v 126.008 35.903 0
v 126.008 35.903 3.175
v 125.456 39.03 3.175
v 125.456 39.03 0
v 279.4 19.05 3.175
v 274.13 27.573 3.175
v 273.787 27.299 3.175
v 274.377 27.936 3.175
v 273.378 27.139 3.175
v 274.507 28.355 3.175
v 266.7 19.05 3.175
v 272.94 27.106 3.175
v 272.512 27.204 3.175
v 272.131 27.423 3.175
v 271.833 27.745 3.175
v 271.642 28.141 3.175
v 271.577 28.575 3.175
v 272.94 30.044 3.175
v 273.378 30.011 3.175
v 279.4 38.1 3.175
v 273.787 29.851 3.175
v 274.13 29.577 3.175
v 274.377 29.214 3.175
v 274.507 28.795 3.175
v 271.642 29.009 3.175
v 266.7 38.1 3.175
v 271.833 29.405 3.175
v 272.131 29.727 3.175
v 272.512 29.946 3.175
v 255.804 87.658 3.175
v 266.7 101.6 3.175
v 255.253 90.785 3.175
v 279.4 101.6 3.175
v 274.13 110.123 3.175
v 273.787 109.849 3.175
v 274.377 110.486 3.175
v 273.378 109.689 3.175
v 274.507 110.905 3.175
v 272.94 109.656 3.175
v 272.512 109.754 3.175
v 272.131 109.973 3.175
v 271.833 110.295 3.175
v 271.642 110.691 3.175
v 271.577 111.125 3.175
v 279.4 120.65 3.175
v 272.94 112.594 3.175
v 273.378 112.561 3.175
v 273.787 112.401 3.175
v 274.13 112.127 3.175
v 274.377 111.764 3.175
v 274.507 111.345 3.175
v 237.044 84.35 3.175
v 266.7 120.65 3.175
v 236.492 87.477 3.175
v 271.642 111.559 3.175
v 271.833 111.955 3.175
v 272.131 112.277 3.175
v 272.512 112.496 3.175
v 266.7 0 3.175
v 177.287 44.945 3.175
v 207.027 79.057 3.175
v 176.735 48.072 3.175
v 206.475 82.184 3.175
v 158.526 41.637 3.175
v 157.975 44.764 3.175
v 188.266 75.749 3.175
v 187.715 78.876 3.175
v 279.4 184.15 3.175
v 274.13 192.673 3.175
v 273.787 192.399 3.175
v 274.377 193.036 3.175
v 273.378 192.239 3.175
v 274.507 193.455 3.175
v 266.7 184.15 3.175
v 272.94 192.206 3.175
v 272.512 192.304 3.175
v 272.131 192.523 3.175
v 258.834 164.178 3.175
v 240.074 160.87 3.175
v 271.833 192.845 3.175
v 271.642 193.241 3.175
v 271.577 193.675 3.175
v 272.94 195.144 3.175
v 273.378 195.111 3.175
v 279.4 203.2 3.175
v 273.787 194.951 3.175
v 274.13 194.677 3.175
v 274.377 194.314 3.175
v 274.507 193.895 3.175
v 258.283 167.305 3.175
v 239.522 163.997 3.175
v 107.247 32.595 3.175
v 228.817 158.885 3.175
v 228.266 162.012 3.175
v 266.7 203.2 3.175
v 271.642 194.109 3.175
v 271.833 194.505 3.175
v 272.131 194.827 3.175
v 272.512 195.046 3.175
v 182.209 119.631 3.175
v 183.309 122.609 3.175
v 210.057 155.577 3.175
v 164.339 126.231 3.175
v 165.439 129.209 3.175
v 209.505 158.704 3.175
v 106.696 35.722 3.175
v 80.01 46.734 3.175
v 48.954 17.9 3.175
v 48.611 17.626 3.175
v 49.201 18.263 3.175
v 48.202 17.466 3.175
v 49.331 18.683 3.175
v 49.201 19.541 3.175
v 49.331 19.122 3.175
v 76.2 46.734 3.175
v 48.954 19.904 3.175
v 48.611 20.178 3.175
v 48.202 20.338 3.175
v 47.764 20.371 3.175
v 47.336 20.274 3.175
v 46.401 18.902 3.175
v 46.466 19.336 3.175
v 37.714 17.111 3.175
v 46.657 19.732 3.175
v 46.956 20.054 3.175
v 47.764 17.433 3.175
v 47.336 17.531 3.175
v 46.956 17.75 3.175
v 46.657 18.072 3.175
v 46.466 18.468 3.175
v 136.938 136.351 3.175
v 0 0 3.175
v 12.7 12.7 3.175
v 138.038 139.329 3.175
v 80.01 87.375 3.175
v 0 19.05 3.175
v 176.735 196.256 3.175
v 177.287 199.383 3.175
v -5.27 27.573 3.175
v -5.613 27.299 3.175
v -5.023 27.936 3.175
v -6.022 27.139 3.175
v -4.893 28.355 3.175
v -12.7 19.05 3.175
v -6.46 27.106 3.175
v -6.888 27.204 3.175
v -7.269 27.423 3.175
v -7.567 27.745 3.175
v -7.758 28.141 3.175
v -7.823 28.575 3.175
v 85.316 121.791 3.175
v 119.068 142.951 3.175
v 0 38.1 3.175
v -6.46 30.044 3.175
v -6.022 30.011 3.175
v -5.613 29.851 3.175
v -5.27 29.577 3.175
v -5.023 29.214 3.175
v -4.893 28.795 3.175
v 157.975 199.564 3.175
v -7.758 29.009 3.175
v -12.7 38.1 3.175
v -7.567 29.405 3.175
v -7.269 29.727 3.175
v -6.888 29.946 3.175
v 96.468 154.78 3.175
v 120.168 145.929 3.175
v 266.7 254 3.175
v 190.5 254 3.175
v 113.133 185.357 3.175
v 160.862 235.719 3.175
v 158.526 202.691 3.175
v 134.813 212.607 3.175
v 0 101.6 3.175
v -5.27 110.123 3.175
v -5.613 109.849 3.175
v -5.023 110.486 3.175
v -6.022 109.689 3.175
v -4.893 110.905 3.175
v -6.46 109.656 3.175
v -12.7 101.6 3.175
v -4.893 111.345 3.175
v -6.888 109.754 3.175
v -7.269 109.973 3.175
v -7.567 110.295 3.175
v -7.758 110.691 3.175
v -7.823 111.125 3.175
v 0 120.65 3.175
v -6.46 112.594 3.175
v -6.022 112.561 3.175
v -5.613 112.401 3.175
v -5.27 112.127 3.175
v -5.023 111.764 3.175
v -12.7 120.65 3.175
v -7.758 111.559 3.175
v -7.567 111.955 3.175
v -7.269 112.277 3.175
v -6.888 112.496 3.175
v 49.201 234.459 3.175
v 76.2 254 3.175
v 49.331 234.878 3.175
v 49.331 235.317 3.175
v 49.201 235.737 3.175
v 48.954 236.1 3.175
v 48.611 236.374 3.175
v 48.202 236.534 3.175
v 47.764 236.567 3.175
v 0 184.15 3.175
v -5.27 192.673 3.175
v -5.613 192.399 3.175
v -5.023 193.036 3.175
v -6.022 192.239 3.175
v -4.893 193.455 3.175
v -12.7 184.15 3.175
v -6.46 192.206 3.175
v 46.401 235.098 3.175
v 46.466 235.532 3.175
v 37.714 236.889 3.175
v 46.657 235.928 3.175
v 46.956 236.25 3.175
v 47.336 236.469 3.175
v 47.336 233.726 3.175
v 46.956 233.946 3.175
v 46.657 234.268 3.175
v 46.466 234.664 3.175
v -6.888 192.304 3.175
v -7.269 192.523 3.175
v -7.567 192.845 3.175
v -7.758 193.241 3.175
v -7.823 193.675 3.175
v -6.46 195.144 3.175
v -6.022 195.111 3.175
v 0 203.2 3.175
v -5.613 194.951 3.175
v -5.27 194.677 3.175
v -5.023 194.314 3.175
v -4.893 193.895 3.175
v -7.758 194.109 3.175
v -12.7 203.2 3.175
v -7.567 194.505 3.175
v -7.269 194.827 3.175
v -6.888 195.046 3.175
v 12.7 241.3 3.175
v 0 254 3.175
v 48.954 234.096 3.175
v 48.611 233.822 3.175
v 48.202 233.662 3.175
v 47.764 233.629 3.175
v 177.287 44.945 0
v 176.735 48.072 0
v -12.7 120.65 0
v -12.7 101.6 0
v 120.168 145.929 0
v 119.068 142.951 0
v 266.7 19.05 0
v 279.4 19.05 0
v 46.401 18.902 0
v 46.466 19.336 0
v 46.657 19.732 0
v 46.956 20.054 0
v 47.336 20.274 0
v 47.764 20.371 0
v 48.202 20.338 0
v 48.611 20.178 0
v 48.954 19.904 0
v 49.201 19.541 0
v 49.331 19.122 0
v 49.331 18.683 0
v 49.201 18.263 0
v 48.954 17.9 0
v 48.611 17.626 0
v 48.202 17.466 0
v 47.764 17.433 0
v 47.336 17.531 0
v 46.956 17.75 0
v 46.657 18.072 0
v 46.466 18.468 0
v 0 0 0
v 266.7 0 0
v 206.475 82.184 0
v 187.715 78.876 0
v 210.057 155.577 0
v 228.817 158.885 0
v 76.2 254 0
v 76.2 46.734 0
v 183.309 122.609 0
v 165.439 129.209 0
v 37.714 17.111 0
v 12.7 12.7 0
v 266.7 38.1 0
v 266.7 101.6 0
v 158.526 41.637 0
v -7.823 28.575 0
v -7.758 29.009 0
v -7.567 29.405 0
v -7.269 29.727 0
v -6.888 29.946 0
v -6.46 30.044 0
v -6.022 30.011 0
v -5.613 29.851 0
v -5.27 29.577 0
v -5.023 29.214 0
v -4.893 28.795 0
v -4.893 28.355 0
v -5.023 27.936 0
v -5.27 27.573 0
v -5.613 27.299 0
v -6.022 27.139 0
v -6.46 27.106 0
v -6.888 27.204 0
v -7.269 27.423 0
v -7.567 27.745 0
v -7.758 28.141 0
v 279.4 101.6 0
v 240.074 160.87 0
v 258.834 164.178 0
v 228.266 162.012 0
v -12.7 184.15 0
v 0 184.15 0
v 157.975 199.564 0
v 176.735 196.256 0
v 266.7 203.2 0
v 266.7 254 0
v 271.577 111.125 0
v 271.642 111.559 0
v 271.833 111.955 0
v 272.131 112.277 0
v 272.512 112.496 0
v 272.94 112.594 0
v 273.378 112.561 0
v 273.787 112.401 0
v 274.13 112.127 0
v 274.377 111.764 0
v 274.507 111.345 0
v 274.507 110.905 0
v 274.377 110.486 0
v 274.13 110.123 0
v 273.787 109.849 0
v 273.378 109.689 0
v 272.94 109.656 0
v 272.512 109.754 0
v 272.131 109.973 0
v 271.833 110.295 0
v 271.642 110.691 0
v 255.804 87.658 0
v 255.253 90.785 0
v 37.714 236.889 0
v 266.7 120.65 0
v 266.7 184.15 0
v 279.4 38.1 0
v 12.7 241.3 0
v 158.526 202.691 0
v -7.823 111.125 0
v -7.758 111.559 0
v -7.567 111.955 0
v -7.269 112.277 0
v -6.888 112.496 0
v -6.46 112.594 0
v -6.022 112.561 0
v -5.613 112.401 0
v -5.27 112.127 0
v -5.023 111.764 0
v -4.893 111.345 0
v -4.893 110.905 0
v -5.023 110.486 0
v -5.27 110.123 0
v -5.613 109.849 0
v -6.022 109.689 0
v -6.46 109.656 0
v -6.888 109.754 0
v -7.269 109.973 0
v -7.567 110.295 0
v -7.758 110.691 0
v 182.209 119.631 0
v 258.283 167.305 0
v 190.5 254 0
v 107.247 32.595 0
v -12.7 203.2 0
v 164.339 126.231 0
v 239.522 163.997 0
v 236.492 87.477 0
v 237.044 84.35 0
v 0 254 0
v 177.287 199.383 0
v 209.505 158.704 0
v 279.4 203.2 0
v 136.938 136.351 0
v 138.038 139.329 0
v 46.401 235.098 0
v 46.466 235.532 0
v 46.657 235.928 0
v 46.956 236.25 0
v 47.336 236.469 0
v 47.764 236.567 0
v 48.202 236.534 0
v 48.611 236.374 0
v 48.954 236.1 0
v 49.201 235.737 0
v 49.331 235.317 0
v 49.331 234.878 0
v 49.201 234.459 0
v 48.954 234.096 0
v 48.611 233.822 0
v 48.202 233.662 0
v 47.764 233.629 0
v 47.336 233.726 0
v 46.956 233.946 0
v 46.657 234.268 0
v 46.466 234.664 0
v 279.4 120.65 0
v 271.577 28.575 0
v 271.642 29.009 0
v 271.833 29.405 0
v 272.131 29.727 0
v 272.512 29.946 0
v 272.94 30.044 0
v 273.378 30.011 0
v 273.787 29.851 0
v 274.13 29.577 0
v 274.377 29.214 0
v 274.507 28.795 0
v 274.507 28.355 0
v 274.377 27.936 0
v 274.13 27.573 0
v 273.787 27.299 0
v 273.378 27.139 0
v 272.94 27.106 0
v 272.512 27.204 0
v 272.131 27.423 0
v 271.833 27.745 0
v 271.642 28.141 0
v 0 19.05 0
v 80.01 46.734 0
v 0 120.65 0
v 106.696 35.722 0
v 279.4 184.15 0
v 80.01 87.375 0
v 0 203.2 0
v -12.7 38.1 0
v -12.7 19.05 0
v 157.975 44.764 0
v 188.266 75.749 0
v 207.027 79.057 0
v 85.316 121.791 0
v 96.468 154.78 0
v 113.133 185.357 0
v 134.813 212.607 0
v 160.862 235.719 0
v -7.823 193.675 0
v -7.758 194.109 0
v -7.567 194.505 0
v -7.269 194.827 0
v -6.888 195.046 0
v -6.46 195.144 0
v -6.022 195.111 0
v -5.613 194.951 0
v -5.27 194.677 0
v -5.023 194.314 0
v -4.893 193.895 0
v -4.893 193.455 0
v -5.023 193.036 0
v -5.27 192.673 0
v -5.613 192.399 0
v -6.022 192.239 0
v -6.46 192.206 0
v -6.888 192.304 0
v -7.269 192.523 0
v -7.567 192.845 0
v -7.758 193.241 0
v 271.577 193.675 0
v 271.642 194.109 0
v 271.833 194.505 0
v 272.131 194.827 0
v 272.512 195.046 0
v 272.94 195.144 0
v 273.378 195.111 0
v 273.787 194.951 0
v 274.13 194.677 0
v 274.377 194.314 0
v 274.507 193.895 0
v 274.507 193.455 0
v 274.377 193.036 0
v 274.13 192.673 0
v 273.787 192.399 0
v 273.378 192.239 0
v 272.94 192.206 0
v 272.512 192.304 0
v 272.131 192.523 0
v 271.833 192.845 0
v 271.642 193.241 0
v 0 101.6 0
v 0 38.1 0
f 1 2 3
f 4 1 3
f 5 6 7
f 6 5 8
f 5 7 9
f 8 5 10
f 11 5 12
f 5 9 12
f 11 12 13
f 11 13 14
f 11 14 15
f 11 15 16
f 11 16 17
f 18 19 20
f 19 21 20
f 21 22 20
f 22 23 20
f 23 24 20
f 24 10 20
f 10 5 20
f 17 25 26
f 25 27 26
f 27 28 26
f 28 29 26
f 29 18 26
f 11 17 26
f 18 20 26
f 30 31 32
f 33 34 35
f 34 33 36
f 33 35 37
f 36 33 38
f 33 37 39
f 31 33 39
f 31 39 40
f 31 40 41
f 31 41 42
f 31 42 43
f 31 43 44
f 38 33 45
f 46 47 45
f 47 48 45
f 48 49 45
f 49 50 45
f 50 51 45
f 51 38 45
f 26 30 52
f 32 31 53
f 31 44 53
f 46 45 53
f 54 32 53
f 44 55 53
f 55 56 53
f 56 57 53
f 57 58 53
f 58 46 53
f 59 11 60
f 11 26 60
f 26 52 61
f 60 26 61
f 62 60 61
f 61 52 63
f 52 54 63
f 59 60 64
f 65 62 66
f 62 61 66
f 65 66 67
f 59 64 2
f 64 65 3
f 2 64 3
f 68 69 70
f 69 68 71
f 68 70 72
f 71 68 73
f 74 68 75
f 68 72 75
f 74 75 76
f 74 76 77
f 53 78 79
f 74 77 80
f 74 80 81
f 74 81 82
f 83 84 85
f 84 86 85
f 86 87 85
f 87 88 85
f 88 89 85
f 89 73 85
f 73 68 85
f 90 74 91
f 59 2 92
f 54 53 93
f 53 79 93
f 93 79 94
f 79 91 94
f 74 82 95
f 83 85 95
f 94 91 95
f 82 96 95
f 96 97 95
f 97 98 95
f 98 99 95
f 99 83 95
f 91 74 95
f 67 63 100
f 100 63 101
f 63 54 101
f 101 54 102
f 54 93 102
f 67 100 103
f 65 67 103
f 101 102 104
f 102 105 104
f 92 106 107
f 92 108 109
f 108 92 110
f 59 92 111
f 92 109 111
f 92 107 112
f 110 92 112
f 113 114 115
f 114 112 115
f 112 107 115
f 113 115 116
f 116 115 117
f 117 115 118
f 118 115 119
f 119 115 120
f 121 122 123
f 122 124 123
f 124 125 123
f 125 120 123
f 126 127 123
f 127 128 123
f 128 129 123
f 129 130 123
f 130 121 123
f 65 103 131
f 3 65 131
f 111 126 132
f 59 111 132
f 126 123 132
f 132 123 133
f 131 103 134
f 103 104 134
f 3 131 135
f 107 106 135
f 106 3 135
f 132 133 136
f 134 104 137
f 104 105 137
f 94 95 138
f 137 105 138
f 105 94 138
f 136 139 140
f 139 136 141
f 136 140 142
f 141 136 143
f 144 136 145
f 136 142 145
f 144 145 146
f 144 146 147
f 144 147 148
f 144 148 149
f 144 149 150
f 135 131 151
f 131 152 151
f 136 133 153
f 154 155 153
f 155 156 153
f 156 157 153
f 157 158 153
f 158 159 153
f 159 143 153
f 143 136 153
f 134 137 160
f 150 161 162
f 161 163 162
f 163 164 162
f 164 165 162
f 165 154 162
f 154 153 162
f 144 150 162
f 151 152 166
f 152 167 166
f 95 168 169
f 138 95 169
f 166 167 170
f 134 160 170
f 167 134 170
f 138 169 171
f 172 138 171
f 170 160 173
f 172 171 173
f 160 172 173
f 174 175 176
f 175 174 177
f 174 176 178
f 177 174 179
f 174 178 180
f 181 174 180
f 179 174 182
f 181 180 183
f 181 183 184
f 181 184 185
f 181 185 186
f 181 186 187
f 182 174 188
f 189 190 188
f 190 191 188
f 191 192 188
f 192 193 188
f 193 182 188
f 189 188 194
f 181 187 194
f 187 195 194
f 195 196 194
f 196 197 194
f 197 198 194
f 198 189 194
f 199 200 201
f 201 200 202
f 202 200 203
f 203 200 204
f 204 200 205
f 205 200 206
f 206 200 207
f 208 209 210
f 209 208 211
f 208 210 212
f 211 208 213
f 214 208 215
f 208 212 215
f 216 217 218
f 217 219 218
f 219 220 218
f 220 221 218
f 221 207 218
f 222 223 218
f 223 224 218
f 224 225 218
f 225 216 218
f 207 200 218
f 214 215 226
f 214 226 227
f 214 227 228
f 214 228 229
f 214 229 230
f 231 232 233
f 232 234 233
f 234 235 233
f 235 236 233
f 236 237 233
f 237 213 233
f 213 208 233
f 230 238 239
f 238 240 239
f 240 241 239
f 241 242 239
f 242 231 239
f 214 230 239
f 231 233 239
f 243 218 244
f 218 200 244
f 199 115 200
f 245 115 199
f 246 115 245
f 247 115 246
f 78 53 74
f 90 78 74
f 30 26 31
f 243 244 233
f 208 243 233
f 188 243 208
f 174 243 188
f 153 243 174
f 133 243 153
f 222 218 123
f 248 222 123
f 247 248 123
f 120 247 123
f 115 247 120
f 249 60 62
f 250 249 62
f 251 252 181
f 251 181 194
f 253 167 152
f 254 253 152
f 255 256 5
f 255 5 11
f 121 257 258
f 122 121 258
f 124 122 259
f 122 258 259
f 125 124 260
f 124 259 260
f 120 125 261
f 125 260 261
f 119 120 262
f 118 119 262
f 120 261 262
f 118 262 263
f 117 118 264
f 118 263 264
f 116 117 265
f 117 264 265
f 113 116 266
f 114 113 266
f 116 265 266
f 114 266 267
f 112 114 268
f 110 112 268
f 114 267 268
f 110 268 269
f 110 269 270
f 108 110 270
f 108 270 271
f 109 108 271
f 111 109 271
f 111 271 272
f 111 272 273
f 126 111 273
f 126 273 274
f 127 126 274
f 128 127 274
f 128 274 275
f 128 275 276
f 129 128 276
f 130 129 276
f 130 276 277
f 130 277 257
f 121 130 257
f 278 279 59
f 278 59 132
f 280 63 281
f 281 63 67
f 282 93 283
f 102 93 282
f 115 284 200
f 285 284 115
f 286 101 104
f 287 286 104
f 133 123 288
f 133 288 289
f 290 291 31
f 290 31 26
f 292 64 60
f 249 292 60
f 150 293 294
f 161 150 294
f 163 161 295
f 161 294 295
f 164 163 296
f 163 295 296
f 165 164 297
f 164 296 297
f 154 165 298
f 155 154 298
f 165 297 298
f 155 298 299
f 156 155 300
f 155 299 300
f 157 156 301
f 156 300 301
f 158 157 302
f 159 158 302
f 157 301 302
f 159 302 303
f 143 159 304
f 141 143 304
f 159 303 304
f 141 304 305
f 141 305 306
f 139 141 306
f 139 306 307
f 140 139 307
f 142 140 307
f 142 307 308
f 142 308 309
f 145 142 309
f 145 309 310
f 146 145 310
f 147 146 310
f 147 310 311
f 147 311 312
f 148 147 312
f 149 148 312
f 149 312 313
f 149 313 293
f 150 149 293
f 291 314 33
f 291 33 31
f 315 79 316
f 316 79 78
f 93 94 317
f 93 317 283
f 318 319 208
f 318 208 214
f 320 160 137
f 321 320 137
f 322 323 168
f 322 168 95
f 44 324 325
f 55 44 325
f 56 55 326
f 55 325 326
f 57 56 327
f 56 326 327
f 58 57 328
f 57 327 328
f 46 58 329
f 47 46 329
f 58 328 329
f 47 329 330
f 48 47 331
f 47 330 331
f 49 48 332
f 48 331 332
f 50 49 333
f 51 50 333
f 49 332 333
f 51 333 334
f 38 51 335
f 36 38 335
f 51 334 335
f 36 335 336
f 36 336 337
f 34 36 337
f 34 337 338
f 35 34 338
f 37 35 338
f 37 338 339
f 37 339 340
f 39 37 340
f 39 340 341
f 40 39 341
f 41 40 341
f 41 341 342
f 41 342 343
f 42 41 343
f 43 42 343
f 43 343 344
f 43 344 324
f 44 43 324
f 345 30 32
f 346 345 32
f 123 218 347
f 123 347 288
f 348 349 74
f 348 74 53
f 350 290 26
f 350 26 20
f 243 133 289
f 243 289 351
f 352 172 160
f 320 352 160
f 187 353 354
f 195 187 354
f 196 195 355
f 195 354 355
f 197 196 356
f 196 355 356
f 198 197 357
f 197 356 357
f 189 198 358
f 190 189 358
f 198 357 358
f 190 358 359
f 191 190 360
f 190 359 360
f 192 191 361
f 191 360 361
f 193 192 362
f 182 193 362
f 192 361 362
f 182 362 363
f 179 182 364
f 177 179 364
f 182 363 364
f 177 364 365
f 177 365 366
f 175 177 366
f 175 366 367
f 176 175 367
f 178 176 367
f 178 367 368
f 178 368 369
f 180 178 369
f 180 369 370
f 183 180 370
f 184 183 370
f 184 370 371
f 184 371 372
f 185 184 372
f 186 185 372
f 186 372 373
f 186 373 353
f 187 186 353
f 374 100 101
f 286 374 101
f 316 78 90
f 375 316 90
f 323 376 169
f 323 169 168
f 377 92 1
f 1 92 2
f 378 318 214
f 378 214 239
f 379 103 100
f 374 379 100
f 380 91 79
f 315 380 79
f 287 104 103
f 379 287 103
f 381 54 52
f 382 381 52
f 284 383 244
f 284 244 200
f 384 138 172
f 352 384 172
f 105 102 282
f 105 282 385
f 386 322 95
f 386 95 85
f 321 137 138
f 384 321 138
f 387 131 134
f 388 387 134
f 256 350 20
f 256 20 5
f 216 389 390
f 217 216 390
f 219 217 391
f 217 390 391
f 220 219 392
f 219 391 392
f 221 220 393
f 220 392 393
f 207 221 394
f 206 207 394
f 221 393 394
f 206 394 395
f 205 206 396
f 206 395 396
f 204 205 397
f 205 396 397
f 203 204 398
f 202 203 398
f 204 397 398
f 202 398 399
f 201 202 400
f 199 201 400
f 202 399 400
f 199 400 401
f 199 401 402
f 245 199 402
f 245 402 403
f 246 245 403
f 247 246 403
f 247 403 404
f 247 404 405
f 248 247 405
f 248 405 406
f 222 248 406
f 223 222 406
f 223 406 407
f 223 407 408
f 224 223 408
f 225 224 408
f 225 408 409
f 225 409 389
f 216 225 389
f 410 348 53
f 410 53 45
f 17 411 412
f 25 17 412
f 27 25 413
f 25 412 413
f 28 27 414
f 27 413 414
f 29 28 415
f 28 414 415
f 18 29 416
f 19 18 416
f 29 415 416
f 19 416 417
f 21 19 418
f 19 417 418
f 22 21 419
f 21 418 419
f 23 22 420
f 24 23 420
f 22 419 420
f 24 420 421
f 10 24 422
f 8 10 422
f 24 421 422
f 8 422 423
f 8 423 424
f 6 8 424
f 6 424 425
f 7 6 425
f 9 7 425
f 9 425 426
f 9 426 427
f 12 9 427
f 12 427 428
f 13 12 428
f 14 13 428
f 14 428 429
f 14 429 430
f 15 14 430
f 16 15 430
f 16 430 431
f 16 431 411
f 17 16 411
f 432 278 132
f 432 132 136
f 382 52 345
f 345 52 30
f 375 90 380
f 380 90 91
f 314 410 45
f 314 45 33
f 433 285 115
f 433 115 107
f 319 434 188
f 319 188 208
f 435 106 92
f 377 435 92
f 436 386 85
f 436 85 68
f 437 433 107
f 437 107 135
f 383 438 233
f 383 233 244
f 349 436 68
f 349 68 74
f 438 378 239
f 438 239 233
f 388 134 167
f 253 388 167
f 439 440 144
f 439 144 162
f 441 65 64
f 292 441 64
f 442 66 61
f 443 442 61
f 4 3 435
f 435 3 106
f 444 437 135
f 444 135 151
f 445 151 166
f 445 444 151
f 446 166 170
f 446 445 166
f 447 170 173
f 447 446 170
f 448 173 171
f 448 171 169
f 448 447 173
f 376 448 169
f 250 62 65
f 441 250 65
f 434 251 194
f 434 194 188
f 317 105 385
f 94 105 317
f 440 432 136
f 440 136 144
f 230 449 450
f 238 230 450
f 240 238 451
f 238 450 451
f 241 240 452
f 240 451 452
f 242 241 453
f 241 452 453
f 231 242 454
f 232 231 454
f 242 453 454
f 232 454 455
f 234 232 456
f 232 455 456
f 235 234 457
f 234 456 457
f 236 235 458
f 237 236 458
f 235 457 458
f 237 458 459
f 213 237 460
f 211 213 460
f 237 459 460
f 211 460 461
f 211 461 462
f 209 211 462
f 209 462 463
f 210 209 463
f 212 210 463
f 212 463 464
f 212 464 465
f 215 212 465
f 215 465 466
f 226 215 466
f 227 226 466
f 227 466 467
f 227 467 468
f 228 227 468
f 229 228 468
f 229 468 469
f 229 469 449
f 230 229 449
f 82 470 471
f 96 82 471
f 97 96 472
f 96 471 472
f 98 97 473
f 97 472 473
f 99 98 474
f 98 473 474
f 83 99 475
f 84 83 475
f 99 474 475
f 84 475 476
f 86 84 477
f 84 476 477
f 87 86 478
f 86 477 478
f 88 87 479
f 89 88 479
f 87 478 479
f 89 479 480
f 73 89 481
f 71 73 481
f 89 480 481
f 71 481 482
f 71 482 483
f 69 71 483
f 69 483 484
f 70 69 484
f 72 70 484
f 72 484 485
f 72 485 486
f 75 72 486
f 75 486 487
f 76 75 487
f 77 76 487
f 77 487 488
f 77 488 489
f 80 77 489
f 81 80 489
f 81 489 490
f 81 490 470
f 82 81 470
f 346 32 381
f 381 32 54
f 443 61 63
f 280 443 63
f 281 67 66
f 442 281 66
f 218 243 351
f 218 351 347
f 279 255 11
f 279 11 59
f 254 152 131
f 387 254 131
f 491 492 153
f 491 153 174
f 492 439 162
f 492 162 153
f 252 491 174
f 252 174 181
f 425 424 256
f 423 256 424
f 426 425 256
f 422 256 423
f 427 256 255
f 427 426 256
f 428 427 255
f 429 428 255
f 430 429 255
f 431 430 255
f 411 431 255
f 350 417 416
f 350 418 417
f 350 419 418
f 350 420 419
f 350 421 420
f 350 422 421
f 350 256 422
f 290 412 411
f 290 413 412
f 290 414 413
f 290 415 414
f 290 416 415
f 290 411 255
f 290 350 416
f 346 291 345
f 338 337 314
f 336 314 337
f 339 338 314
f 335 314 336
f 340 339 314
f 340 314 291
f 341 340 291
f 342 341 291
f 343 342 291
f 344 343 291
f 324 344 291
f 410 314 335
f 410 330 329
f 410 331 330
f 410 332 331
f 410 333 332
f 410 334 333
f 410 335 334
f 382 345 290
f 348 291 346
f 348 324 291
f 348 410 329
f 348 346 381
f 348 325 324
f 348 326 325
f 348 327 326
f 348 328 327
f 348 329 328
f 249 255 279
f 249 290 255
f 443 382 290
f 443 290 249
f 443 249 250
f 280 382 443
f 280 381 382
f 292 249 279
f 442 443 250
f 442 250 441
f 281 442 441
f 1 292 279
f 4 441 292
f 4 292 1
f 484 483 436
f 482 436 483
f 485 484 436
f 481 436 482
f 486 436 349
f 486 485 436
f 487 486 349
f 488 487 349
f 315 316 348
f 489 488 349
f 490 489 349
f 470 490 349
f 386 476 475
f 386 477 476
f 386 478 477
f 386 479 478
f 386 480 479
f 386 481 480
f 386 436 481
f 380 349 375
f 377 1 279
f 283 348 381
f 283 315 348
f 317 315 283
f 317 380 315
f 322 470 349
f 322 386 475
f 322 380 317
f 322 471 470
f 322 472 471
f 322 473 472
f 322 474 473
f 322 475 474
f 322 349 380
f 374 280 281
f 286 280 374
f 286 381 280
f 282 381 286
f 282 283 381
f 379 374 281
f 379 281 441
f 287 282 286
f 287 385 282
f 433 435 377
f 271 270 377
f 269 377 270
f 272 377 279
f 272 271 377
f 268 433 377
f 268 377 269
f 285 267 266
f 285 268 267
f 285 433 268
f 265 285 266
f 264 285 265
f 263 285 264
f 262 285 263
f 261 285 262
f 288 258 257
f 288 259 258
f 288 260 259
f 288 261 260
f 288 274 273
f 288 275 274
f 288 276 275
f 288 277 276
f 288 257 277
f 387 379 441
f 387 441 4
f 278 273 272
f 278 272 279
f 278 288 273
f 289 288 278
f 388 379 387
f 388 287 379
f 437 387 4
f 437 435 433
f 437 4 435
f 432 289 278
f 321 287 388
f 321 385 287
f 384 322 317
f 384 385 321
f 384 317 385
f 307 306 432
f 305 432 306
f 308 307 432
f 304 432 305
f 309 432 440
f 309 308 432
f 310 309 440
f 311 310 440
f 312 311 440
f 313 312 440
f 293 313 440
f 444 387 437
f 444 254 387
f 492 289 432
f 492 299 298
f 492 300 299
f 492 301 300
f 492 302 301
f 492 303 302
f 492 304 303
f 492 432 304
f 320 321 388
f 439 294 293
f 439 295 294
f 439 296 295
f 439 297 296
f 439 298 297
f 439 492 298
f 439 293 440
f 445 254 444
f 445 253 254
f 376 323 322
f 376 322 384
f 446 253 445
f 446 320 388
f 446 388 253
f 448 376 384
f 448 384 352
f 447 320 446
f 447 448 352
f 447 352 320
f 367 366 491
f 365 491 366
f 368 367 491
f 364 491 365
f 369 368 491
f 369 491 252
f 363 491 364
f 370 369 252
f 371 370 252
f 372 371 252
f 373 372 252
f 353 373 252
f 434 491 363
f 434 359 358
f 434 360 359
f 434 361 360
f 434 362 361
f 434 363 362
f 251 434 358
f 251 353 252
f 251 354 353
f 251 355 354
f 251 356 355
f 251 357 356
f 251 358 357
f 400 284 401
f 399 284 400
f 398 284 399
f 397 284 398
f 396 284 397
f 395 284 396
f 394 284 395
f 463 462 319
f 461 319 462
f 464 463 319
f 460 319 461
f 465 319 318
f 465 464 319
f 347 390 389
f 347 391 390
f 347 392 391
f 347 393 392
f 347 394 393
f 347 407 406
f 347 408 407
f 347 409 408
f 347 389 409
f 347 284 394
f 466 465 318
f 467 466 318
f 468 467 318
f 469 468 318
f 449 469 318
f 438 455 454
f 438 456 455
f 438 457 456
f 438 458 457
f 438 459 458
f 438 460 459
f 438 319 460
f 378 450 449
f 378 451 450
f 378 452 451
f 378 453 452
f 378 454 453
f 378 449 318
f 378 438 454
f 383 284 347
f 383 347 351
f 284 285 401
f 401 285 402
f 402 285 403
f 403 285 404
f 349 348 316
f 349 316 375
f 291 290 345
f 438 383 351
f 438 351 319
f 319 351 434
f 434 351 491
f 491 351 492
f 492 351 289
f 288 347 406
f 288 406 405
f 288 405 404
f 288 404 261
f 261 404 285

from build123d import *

# Parameters (mm, degrees)
BOSS_EXTRUDE1_DEPTH   = 3.175
CUT_EXTRUDE5_DEPTH    = 378.611494297
F_4_CLEARANCE_HOLE1_D = 2.9464
CUT_EXTRUDE15_DEPTH   = 378.611494297


with BuildPart() as part:
    # Sketch1 → Boss-Extrude1 (new body)
    with BuildSketch(Plane.XY):
        with BuildLine():
            Line((76.2, 254), (76.2, 46.734177824))
            Line((76.2, 46.734177824), (80.01, 46.734177824))
            Line((80.01, 46.734177824), (80.01, 87.374980319))
            ThreePointArc((80.01, 87.374980319), (113.133038802, 185.356688684), (190.5, 254))
            Line((190.5, 254), (266.7, 254))
            Line((266.7, 254), (266.7, 203.2))
            Line((266.7, 203.2), (279.4, 203.2))
            Line((279.4, 203.2), (279.4, 184.15))
            Line((279.4, 184.15), (266.7, 184.15))
            Line((266.7, 184.15), (266.7, 120.65))
            Line((266.7, 120.65), (279.4, 120.65))
            Line((279.4, 120.65), (279.4, 101.6))
            Line((279.4, 101.6), (266.7, 101.6))
            Line((266.7, 101.6), (266.7, 38.1))
            Line((266.7, 38.1), (279.4, 38.1))
            Line((279.4, 38.1), (279.4, 19.05))
            Line((279.4, 19.05), (266.7, 19.05))
            Line((266.7, 19.05), (266.7, 0))
            Line((266.7, 0), (0, 0))
            Line((0, 0), (0, 19.05))
            Line((0, 19.05), (-12.7, 19.05))
            Line((-12.7, 19.05), (-12.7, 38.1))
            Line((-12.7, 38.1), (0, 38.1))
            Line((0, 38.1), (0, 101.6))
            Line((0, 101.6), (-12.7, 101.6))
            Line((-12.7, 101.6), (-12.7, 120.65))
            Line((-12.7, 120.65), (0, 120.65))
            Line((0, 120.65), (0, 184.15))
            Line((0, 184.15), (-12.7, 184.15))
            Line((-12.7, 184.15), (-12.7, 203.2))
            Line((-12.7, 203.2), (0, 203.2))
            Line((0, 203.2), (0, 254))
            Line((0, 254), (76.2, 254))
        make_face()
    extrude(amount=BOSS_EXTRUDE1_DEPTH)

    # Sketch10 → Cut-Extrude5 (cut, through all)
    with BuildSketch(Plane.XY.offset(3.175)):
        Polygon((12.7, 12.7), (12.7, 241.3), (37.714116927, 236.889336287), (37.714116927, 17.110663713), align=None)
    extrude(amount=-CUT_EXTRUDE5_DEPTH, mode=Mode.SUBTRACT)

    # #4 Clearance Hole1 (through all)
    with Locations(Plane.XY.offset(3.175)):
        with Locations((-6.35, 193.675), (-6.35, 111.125), (-6.35, 28.575), (273.05, 193.675), (273.05, 111.125), (273.05, 28.575), (47.874116927, 235.097854163), (47.874116927, 18.902145837)):
            Hole(F_4_CLEARANCE_HOLE1_D / 2)

    # Sketch21 → Cut-Extrude15 (cut, through all)
    with BuildSketch(Plane.XY.offset(3.175)):
        Polygon((158.526152675, 202.69099682), (157.974819711, 199.564232204), (176.735407405, 196.256234419), (177.286740369, 199.382999035), align=None)
        Polygon((239.522435721, 163.996596363), (240.073768685, 160.869831747), (258.83435638, 164.177829531), (258.283023416, 167.304594147), align=None)
        Polygon((120.16783778, 145.92910773), (119.067835825, 142.950749004), (136.937988179, 136.350737274), (138.037990134, 139.329096), align=None)
        Polygon((165.43889041, 129.209078013), (164.338888455, 126.230719288), (182.20904081, 119.630707557), (183.309042765, 122.609066283), align=None)
        Polygon((236.492169338, 87.476937109), (237.043502302, 84.350172493), (255.804089997, 87.658170277), (255.252757033, 90.784934893), align=None)
        Polygon((187.714641331, 78.876142869), (188.265974296, 75.749378253), (207.02656199, 79.057376038), (206.475229026, 82.184140653), align=None)
        Polygon((228.266083104, 162.011797692), (228.817416068, 158.885033076), (210.056828373, 155.577035291), (209.505495409, 158.703799907), align=None)
        Polygon((106.695880011, 35.721968707), (107.247212975, 32.595204091), (126.00780067, 35.903201876), (125.456467706, 39.029966491), align=None)
        Polygon((157.974819711, 44.763829318), (158.526152675, 41.637064702), (177.286740369, 44.945062487), (176.735407405, 48.071827103), align=None)
    extrude(amount=-CUT_EXTRUDE15_DEPTH, mode=Mode.SUBTRACT)


solid = part.part
